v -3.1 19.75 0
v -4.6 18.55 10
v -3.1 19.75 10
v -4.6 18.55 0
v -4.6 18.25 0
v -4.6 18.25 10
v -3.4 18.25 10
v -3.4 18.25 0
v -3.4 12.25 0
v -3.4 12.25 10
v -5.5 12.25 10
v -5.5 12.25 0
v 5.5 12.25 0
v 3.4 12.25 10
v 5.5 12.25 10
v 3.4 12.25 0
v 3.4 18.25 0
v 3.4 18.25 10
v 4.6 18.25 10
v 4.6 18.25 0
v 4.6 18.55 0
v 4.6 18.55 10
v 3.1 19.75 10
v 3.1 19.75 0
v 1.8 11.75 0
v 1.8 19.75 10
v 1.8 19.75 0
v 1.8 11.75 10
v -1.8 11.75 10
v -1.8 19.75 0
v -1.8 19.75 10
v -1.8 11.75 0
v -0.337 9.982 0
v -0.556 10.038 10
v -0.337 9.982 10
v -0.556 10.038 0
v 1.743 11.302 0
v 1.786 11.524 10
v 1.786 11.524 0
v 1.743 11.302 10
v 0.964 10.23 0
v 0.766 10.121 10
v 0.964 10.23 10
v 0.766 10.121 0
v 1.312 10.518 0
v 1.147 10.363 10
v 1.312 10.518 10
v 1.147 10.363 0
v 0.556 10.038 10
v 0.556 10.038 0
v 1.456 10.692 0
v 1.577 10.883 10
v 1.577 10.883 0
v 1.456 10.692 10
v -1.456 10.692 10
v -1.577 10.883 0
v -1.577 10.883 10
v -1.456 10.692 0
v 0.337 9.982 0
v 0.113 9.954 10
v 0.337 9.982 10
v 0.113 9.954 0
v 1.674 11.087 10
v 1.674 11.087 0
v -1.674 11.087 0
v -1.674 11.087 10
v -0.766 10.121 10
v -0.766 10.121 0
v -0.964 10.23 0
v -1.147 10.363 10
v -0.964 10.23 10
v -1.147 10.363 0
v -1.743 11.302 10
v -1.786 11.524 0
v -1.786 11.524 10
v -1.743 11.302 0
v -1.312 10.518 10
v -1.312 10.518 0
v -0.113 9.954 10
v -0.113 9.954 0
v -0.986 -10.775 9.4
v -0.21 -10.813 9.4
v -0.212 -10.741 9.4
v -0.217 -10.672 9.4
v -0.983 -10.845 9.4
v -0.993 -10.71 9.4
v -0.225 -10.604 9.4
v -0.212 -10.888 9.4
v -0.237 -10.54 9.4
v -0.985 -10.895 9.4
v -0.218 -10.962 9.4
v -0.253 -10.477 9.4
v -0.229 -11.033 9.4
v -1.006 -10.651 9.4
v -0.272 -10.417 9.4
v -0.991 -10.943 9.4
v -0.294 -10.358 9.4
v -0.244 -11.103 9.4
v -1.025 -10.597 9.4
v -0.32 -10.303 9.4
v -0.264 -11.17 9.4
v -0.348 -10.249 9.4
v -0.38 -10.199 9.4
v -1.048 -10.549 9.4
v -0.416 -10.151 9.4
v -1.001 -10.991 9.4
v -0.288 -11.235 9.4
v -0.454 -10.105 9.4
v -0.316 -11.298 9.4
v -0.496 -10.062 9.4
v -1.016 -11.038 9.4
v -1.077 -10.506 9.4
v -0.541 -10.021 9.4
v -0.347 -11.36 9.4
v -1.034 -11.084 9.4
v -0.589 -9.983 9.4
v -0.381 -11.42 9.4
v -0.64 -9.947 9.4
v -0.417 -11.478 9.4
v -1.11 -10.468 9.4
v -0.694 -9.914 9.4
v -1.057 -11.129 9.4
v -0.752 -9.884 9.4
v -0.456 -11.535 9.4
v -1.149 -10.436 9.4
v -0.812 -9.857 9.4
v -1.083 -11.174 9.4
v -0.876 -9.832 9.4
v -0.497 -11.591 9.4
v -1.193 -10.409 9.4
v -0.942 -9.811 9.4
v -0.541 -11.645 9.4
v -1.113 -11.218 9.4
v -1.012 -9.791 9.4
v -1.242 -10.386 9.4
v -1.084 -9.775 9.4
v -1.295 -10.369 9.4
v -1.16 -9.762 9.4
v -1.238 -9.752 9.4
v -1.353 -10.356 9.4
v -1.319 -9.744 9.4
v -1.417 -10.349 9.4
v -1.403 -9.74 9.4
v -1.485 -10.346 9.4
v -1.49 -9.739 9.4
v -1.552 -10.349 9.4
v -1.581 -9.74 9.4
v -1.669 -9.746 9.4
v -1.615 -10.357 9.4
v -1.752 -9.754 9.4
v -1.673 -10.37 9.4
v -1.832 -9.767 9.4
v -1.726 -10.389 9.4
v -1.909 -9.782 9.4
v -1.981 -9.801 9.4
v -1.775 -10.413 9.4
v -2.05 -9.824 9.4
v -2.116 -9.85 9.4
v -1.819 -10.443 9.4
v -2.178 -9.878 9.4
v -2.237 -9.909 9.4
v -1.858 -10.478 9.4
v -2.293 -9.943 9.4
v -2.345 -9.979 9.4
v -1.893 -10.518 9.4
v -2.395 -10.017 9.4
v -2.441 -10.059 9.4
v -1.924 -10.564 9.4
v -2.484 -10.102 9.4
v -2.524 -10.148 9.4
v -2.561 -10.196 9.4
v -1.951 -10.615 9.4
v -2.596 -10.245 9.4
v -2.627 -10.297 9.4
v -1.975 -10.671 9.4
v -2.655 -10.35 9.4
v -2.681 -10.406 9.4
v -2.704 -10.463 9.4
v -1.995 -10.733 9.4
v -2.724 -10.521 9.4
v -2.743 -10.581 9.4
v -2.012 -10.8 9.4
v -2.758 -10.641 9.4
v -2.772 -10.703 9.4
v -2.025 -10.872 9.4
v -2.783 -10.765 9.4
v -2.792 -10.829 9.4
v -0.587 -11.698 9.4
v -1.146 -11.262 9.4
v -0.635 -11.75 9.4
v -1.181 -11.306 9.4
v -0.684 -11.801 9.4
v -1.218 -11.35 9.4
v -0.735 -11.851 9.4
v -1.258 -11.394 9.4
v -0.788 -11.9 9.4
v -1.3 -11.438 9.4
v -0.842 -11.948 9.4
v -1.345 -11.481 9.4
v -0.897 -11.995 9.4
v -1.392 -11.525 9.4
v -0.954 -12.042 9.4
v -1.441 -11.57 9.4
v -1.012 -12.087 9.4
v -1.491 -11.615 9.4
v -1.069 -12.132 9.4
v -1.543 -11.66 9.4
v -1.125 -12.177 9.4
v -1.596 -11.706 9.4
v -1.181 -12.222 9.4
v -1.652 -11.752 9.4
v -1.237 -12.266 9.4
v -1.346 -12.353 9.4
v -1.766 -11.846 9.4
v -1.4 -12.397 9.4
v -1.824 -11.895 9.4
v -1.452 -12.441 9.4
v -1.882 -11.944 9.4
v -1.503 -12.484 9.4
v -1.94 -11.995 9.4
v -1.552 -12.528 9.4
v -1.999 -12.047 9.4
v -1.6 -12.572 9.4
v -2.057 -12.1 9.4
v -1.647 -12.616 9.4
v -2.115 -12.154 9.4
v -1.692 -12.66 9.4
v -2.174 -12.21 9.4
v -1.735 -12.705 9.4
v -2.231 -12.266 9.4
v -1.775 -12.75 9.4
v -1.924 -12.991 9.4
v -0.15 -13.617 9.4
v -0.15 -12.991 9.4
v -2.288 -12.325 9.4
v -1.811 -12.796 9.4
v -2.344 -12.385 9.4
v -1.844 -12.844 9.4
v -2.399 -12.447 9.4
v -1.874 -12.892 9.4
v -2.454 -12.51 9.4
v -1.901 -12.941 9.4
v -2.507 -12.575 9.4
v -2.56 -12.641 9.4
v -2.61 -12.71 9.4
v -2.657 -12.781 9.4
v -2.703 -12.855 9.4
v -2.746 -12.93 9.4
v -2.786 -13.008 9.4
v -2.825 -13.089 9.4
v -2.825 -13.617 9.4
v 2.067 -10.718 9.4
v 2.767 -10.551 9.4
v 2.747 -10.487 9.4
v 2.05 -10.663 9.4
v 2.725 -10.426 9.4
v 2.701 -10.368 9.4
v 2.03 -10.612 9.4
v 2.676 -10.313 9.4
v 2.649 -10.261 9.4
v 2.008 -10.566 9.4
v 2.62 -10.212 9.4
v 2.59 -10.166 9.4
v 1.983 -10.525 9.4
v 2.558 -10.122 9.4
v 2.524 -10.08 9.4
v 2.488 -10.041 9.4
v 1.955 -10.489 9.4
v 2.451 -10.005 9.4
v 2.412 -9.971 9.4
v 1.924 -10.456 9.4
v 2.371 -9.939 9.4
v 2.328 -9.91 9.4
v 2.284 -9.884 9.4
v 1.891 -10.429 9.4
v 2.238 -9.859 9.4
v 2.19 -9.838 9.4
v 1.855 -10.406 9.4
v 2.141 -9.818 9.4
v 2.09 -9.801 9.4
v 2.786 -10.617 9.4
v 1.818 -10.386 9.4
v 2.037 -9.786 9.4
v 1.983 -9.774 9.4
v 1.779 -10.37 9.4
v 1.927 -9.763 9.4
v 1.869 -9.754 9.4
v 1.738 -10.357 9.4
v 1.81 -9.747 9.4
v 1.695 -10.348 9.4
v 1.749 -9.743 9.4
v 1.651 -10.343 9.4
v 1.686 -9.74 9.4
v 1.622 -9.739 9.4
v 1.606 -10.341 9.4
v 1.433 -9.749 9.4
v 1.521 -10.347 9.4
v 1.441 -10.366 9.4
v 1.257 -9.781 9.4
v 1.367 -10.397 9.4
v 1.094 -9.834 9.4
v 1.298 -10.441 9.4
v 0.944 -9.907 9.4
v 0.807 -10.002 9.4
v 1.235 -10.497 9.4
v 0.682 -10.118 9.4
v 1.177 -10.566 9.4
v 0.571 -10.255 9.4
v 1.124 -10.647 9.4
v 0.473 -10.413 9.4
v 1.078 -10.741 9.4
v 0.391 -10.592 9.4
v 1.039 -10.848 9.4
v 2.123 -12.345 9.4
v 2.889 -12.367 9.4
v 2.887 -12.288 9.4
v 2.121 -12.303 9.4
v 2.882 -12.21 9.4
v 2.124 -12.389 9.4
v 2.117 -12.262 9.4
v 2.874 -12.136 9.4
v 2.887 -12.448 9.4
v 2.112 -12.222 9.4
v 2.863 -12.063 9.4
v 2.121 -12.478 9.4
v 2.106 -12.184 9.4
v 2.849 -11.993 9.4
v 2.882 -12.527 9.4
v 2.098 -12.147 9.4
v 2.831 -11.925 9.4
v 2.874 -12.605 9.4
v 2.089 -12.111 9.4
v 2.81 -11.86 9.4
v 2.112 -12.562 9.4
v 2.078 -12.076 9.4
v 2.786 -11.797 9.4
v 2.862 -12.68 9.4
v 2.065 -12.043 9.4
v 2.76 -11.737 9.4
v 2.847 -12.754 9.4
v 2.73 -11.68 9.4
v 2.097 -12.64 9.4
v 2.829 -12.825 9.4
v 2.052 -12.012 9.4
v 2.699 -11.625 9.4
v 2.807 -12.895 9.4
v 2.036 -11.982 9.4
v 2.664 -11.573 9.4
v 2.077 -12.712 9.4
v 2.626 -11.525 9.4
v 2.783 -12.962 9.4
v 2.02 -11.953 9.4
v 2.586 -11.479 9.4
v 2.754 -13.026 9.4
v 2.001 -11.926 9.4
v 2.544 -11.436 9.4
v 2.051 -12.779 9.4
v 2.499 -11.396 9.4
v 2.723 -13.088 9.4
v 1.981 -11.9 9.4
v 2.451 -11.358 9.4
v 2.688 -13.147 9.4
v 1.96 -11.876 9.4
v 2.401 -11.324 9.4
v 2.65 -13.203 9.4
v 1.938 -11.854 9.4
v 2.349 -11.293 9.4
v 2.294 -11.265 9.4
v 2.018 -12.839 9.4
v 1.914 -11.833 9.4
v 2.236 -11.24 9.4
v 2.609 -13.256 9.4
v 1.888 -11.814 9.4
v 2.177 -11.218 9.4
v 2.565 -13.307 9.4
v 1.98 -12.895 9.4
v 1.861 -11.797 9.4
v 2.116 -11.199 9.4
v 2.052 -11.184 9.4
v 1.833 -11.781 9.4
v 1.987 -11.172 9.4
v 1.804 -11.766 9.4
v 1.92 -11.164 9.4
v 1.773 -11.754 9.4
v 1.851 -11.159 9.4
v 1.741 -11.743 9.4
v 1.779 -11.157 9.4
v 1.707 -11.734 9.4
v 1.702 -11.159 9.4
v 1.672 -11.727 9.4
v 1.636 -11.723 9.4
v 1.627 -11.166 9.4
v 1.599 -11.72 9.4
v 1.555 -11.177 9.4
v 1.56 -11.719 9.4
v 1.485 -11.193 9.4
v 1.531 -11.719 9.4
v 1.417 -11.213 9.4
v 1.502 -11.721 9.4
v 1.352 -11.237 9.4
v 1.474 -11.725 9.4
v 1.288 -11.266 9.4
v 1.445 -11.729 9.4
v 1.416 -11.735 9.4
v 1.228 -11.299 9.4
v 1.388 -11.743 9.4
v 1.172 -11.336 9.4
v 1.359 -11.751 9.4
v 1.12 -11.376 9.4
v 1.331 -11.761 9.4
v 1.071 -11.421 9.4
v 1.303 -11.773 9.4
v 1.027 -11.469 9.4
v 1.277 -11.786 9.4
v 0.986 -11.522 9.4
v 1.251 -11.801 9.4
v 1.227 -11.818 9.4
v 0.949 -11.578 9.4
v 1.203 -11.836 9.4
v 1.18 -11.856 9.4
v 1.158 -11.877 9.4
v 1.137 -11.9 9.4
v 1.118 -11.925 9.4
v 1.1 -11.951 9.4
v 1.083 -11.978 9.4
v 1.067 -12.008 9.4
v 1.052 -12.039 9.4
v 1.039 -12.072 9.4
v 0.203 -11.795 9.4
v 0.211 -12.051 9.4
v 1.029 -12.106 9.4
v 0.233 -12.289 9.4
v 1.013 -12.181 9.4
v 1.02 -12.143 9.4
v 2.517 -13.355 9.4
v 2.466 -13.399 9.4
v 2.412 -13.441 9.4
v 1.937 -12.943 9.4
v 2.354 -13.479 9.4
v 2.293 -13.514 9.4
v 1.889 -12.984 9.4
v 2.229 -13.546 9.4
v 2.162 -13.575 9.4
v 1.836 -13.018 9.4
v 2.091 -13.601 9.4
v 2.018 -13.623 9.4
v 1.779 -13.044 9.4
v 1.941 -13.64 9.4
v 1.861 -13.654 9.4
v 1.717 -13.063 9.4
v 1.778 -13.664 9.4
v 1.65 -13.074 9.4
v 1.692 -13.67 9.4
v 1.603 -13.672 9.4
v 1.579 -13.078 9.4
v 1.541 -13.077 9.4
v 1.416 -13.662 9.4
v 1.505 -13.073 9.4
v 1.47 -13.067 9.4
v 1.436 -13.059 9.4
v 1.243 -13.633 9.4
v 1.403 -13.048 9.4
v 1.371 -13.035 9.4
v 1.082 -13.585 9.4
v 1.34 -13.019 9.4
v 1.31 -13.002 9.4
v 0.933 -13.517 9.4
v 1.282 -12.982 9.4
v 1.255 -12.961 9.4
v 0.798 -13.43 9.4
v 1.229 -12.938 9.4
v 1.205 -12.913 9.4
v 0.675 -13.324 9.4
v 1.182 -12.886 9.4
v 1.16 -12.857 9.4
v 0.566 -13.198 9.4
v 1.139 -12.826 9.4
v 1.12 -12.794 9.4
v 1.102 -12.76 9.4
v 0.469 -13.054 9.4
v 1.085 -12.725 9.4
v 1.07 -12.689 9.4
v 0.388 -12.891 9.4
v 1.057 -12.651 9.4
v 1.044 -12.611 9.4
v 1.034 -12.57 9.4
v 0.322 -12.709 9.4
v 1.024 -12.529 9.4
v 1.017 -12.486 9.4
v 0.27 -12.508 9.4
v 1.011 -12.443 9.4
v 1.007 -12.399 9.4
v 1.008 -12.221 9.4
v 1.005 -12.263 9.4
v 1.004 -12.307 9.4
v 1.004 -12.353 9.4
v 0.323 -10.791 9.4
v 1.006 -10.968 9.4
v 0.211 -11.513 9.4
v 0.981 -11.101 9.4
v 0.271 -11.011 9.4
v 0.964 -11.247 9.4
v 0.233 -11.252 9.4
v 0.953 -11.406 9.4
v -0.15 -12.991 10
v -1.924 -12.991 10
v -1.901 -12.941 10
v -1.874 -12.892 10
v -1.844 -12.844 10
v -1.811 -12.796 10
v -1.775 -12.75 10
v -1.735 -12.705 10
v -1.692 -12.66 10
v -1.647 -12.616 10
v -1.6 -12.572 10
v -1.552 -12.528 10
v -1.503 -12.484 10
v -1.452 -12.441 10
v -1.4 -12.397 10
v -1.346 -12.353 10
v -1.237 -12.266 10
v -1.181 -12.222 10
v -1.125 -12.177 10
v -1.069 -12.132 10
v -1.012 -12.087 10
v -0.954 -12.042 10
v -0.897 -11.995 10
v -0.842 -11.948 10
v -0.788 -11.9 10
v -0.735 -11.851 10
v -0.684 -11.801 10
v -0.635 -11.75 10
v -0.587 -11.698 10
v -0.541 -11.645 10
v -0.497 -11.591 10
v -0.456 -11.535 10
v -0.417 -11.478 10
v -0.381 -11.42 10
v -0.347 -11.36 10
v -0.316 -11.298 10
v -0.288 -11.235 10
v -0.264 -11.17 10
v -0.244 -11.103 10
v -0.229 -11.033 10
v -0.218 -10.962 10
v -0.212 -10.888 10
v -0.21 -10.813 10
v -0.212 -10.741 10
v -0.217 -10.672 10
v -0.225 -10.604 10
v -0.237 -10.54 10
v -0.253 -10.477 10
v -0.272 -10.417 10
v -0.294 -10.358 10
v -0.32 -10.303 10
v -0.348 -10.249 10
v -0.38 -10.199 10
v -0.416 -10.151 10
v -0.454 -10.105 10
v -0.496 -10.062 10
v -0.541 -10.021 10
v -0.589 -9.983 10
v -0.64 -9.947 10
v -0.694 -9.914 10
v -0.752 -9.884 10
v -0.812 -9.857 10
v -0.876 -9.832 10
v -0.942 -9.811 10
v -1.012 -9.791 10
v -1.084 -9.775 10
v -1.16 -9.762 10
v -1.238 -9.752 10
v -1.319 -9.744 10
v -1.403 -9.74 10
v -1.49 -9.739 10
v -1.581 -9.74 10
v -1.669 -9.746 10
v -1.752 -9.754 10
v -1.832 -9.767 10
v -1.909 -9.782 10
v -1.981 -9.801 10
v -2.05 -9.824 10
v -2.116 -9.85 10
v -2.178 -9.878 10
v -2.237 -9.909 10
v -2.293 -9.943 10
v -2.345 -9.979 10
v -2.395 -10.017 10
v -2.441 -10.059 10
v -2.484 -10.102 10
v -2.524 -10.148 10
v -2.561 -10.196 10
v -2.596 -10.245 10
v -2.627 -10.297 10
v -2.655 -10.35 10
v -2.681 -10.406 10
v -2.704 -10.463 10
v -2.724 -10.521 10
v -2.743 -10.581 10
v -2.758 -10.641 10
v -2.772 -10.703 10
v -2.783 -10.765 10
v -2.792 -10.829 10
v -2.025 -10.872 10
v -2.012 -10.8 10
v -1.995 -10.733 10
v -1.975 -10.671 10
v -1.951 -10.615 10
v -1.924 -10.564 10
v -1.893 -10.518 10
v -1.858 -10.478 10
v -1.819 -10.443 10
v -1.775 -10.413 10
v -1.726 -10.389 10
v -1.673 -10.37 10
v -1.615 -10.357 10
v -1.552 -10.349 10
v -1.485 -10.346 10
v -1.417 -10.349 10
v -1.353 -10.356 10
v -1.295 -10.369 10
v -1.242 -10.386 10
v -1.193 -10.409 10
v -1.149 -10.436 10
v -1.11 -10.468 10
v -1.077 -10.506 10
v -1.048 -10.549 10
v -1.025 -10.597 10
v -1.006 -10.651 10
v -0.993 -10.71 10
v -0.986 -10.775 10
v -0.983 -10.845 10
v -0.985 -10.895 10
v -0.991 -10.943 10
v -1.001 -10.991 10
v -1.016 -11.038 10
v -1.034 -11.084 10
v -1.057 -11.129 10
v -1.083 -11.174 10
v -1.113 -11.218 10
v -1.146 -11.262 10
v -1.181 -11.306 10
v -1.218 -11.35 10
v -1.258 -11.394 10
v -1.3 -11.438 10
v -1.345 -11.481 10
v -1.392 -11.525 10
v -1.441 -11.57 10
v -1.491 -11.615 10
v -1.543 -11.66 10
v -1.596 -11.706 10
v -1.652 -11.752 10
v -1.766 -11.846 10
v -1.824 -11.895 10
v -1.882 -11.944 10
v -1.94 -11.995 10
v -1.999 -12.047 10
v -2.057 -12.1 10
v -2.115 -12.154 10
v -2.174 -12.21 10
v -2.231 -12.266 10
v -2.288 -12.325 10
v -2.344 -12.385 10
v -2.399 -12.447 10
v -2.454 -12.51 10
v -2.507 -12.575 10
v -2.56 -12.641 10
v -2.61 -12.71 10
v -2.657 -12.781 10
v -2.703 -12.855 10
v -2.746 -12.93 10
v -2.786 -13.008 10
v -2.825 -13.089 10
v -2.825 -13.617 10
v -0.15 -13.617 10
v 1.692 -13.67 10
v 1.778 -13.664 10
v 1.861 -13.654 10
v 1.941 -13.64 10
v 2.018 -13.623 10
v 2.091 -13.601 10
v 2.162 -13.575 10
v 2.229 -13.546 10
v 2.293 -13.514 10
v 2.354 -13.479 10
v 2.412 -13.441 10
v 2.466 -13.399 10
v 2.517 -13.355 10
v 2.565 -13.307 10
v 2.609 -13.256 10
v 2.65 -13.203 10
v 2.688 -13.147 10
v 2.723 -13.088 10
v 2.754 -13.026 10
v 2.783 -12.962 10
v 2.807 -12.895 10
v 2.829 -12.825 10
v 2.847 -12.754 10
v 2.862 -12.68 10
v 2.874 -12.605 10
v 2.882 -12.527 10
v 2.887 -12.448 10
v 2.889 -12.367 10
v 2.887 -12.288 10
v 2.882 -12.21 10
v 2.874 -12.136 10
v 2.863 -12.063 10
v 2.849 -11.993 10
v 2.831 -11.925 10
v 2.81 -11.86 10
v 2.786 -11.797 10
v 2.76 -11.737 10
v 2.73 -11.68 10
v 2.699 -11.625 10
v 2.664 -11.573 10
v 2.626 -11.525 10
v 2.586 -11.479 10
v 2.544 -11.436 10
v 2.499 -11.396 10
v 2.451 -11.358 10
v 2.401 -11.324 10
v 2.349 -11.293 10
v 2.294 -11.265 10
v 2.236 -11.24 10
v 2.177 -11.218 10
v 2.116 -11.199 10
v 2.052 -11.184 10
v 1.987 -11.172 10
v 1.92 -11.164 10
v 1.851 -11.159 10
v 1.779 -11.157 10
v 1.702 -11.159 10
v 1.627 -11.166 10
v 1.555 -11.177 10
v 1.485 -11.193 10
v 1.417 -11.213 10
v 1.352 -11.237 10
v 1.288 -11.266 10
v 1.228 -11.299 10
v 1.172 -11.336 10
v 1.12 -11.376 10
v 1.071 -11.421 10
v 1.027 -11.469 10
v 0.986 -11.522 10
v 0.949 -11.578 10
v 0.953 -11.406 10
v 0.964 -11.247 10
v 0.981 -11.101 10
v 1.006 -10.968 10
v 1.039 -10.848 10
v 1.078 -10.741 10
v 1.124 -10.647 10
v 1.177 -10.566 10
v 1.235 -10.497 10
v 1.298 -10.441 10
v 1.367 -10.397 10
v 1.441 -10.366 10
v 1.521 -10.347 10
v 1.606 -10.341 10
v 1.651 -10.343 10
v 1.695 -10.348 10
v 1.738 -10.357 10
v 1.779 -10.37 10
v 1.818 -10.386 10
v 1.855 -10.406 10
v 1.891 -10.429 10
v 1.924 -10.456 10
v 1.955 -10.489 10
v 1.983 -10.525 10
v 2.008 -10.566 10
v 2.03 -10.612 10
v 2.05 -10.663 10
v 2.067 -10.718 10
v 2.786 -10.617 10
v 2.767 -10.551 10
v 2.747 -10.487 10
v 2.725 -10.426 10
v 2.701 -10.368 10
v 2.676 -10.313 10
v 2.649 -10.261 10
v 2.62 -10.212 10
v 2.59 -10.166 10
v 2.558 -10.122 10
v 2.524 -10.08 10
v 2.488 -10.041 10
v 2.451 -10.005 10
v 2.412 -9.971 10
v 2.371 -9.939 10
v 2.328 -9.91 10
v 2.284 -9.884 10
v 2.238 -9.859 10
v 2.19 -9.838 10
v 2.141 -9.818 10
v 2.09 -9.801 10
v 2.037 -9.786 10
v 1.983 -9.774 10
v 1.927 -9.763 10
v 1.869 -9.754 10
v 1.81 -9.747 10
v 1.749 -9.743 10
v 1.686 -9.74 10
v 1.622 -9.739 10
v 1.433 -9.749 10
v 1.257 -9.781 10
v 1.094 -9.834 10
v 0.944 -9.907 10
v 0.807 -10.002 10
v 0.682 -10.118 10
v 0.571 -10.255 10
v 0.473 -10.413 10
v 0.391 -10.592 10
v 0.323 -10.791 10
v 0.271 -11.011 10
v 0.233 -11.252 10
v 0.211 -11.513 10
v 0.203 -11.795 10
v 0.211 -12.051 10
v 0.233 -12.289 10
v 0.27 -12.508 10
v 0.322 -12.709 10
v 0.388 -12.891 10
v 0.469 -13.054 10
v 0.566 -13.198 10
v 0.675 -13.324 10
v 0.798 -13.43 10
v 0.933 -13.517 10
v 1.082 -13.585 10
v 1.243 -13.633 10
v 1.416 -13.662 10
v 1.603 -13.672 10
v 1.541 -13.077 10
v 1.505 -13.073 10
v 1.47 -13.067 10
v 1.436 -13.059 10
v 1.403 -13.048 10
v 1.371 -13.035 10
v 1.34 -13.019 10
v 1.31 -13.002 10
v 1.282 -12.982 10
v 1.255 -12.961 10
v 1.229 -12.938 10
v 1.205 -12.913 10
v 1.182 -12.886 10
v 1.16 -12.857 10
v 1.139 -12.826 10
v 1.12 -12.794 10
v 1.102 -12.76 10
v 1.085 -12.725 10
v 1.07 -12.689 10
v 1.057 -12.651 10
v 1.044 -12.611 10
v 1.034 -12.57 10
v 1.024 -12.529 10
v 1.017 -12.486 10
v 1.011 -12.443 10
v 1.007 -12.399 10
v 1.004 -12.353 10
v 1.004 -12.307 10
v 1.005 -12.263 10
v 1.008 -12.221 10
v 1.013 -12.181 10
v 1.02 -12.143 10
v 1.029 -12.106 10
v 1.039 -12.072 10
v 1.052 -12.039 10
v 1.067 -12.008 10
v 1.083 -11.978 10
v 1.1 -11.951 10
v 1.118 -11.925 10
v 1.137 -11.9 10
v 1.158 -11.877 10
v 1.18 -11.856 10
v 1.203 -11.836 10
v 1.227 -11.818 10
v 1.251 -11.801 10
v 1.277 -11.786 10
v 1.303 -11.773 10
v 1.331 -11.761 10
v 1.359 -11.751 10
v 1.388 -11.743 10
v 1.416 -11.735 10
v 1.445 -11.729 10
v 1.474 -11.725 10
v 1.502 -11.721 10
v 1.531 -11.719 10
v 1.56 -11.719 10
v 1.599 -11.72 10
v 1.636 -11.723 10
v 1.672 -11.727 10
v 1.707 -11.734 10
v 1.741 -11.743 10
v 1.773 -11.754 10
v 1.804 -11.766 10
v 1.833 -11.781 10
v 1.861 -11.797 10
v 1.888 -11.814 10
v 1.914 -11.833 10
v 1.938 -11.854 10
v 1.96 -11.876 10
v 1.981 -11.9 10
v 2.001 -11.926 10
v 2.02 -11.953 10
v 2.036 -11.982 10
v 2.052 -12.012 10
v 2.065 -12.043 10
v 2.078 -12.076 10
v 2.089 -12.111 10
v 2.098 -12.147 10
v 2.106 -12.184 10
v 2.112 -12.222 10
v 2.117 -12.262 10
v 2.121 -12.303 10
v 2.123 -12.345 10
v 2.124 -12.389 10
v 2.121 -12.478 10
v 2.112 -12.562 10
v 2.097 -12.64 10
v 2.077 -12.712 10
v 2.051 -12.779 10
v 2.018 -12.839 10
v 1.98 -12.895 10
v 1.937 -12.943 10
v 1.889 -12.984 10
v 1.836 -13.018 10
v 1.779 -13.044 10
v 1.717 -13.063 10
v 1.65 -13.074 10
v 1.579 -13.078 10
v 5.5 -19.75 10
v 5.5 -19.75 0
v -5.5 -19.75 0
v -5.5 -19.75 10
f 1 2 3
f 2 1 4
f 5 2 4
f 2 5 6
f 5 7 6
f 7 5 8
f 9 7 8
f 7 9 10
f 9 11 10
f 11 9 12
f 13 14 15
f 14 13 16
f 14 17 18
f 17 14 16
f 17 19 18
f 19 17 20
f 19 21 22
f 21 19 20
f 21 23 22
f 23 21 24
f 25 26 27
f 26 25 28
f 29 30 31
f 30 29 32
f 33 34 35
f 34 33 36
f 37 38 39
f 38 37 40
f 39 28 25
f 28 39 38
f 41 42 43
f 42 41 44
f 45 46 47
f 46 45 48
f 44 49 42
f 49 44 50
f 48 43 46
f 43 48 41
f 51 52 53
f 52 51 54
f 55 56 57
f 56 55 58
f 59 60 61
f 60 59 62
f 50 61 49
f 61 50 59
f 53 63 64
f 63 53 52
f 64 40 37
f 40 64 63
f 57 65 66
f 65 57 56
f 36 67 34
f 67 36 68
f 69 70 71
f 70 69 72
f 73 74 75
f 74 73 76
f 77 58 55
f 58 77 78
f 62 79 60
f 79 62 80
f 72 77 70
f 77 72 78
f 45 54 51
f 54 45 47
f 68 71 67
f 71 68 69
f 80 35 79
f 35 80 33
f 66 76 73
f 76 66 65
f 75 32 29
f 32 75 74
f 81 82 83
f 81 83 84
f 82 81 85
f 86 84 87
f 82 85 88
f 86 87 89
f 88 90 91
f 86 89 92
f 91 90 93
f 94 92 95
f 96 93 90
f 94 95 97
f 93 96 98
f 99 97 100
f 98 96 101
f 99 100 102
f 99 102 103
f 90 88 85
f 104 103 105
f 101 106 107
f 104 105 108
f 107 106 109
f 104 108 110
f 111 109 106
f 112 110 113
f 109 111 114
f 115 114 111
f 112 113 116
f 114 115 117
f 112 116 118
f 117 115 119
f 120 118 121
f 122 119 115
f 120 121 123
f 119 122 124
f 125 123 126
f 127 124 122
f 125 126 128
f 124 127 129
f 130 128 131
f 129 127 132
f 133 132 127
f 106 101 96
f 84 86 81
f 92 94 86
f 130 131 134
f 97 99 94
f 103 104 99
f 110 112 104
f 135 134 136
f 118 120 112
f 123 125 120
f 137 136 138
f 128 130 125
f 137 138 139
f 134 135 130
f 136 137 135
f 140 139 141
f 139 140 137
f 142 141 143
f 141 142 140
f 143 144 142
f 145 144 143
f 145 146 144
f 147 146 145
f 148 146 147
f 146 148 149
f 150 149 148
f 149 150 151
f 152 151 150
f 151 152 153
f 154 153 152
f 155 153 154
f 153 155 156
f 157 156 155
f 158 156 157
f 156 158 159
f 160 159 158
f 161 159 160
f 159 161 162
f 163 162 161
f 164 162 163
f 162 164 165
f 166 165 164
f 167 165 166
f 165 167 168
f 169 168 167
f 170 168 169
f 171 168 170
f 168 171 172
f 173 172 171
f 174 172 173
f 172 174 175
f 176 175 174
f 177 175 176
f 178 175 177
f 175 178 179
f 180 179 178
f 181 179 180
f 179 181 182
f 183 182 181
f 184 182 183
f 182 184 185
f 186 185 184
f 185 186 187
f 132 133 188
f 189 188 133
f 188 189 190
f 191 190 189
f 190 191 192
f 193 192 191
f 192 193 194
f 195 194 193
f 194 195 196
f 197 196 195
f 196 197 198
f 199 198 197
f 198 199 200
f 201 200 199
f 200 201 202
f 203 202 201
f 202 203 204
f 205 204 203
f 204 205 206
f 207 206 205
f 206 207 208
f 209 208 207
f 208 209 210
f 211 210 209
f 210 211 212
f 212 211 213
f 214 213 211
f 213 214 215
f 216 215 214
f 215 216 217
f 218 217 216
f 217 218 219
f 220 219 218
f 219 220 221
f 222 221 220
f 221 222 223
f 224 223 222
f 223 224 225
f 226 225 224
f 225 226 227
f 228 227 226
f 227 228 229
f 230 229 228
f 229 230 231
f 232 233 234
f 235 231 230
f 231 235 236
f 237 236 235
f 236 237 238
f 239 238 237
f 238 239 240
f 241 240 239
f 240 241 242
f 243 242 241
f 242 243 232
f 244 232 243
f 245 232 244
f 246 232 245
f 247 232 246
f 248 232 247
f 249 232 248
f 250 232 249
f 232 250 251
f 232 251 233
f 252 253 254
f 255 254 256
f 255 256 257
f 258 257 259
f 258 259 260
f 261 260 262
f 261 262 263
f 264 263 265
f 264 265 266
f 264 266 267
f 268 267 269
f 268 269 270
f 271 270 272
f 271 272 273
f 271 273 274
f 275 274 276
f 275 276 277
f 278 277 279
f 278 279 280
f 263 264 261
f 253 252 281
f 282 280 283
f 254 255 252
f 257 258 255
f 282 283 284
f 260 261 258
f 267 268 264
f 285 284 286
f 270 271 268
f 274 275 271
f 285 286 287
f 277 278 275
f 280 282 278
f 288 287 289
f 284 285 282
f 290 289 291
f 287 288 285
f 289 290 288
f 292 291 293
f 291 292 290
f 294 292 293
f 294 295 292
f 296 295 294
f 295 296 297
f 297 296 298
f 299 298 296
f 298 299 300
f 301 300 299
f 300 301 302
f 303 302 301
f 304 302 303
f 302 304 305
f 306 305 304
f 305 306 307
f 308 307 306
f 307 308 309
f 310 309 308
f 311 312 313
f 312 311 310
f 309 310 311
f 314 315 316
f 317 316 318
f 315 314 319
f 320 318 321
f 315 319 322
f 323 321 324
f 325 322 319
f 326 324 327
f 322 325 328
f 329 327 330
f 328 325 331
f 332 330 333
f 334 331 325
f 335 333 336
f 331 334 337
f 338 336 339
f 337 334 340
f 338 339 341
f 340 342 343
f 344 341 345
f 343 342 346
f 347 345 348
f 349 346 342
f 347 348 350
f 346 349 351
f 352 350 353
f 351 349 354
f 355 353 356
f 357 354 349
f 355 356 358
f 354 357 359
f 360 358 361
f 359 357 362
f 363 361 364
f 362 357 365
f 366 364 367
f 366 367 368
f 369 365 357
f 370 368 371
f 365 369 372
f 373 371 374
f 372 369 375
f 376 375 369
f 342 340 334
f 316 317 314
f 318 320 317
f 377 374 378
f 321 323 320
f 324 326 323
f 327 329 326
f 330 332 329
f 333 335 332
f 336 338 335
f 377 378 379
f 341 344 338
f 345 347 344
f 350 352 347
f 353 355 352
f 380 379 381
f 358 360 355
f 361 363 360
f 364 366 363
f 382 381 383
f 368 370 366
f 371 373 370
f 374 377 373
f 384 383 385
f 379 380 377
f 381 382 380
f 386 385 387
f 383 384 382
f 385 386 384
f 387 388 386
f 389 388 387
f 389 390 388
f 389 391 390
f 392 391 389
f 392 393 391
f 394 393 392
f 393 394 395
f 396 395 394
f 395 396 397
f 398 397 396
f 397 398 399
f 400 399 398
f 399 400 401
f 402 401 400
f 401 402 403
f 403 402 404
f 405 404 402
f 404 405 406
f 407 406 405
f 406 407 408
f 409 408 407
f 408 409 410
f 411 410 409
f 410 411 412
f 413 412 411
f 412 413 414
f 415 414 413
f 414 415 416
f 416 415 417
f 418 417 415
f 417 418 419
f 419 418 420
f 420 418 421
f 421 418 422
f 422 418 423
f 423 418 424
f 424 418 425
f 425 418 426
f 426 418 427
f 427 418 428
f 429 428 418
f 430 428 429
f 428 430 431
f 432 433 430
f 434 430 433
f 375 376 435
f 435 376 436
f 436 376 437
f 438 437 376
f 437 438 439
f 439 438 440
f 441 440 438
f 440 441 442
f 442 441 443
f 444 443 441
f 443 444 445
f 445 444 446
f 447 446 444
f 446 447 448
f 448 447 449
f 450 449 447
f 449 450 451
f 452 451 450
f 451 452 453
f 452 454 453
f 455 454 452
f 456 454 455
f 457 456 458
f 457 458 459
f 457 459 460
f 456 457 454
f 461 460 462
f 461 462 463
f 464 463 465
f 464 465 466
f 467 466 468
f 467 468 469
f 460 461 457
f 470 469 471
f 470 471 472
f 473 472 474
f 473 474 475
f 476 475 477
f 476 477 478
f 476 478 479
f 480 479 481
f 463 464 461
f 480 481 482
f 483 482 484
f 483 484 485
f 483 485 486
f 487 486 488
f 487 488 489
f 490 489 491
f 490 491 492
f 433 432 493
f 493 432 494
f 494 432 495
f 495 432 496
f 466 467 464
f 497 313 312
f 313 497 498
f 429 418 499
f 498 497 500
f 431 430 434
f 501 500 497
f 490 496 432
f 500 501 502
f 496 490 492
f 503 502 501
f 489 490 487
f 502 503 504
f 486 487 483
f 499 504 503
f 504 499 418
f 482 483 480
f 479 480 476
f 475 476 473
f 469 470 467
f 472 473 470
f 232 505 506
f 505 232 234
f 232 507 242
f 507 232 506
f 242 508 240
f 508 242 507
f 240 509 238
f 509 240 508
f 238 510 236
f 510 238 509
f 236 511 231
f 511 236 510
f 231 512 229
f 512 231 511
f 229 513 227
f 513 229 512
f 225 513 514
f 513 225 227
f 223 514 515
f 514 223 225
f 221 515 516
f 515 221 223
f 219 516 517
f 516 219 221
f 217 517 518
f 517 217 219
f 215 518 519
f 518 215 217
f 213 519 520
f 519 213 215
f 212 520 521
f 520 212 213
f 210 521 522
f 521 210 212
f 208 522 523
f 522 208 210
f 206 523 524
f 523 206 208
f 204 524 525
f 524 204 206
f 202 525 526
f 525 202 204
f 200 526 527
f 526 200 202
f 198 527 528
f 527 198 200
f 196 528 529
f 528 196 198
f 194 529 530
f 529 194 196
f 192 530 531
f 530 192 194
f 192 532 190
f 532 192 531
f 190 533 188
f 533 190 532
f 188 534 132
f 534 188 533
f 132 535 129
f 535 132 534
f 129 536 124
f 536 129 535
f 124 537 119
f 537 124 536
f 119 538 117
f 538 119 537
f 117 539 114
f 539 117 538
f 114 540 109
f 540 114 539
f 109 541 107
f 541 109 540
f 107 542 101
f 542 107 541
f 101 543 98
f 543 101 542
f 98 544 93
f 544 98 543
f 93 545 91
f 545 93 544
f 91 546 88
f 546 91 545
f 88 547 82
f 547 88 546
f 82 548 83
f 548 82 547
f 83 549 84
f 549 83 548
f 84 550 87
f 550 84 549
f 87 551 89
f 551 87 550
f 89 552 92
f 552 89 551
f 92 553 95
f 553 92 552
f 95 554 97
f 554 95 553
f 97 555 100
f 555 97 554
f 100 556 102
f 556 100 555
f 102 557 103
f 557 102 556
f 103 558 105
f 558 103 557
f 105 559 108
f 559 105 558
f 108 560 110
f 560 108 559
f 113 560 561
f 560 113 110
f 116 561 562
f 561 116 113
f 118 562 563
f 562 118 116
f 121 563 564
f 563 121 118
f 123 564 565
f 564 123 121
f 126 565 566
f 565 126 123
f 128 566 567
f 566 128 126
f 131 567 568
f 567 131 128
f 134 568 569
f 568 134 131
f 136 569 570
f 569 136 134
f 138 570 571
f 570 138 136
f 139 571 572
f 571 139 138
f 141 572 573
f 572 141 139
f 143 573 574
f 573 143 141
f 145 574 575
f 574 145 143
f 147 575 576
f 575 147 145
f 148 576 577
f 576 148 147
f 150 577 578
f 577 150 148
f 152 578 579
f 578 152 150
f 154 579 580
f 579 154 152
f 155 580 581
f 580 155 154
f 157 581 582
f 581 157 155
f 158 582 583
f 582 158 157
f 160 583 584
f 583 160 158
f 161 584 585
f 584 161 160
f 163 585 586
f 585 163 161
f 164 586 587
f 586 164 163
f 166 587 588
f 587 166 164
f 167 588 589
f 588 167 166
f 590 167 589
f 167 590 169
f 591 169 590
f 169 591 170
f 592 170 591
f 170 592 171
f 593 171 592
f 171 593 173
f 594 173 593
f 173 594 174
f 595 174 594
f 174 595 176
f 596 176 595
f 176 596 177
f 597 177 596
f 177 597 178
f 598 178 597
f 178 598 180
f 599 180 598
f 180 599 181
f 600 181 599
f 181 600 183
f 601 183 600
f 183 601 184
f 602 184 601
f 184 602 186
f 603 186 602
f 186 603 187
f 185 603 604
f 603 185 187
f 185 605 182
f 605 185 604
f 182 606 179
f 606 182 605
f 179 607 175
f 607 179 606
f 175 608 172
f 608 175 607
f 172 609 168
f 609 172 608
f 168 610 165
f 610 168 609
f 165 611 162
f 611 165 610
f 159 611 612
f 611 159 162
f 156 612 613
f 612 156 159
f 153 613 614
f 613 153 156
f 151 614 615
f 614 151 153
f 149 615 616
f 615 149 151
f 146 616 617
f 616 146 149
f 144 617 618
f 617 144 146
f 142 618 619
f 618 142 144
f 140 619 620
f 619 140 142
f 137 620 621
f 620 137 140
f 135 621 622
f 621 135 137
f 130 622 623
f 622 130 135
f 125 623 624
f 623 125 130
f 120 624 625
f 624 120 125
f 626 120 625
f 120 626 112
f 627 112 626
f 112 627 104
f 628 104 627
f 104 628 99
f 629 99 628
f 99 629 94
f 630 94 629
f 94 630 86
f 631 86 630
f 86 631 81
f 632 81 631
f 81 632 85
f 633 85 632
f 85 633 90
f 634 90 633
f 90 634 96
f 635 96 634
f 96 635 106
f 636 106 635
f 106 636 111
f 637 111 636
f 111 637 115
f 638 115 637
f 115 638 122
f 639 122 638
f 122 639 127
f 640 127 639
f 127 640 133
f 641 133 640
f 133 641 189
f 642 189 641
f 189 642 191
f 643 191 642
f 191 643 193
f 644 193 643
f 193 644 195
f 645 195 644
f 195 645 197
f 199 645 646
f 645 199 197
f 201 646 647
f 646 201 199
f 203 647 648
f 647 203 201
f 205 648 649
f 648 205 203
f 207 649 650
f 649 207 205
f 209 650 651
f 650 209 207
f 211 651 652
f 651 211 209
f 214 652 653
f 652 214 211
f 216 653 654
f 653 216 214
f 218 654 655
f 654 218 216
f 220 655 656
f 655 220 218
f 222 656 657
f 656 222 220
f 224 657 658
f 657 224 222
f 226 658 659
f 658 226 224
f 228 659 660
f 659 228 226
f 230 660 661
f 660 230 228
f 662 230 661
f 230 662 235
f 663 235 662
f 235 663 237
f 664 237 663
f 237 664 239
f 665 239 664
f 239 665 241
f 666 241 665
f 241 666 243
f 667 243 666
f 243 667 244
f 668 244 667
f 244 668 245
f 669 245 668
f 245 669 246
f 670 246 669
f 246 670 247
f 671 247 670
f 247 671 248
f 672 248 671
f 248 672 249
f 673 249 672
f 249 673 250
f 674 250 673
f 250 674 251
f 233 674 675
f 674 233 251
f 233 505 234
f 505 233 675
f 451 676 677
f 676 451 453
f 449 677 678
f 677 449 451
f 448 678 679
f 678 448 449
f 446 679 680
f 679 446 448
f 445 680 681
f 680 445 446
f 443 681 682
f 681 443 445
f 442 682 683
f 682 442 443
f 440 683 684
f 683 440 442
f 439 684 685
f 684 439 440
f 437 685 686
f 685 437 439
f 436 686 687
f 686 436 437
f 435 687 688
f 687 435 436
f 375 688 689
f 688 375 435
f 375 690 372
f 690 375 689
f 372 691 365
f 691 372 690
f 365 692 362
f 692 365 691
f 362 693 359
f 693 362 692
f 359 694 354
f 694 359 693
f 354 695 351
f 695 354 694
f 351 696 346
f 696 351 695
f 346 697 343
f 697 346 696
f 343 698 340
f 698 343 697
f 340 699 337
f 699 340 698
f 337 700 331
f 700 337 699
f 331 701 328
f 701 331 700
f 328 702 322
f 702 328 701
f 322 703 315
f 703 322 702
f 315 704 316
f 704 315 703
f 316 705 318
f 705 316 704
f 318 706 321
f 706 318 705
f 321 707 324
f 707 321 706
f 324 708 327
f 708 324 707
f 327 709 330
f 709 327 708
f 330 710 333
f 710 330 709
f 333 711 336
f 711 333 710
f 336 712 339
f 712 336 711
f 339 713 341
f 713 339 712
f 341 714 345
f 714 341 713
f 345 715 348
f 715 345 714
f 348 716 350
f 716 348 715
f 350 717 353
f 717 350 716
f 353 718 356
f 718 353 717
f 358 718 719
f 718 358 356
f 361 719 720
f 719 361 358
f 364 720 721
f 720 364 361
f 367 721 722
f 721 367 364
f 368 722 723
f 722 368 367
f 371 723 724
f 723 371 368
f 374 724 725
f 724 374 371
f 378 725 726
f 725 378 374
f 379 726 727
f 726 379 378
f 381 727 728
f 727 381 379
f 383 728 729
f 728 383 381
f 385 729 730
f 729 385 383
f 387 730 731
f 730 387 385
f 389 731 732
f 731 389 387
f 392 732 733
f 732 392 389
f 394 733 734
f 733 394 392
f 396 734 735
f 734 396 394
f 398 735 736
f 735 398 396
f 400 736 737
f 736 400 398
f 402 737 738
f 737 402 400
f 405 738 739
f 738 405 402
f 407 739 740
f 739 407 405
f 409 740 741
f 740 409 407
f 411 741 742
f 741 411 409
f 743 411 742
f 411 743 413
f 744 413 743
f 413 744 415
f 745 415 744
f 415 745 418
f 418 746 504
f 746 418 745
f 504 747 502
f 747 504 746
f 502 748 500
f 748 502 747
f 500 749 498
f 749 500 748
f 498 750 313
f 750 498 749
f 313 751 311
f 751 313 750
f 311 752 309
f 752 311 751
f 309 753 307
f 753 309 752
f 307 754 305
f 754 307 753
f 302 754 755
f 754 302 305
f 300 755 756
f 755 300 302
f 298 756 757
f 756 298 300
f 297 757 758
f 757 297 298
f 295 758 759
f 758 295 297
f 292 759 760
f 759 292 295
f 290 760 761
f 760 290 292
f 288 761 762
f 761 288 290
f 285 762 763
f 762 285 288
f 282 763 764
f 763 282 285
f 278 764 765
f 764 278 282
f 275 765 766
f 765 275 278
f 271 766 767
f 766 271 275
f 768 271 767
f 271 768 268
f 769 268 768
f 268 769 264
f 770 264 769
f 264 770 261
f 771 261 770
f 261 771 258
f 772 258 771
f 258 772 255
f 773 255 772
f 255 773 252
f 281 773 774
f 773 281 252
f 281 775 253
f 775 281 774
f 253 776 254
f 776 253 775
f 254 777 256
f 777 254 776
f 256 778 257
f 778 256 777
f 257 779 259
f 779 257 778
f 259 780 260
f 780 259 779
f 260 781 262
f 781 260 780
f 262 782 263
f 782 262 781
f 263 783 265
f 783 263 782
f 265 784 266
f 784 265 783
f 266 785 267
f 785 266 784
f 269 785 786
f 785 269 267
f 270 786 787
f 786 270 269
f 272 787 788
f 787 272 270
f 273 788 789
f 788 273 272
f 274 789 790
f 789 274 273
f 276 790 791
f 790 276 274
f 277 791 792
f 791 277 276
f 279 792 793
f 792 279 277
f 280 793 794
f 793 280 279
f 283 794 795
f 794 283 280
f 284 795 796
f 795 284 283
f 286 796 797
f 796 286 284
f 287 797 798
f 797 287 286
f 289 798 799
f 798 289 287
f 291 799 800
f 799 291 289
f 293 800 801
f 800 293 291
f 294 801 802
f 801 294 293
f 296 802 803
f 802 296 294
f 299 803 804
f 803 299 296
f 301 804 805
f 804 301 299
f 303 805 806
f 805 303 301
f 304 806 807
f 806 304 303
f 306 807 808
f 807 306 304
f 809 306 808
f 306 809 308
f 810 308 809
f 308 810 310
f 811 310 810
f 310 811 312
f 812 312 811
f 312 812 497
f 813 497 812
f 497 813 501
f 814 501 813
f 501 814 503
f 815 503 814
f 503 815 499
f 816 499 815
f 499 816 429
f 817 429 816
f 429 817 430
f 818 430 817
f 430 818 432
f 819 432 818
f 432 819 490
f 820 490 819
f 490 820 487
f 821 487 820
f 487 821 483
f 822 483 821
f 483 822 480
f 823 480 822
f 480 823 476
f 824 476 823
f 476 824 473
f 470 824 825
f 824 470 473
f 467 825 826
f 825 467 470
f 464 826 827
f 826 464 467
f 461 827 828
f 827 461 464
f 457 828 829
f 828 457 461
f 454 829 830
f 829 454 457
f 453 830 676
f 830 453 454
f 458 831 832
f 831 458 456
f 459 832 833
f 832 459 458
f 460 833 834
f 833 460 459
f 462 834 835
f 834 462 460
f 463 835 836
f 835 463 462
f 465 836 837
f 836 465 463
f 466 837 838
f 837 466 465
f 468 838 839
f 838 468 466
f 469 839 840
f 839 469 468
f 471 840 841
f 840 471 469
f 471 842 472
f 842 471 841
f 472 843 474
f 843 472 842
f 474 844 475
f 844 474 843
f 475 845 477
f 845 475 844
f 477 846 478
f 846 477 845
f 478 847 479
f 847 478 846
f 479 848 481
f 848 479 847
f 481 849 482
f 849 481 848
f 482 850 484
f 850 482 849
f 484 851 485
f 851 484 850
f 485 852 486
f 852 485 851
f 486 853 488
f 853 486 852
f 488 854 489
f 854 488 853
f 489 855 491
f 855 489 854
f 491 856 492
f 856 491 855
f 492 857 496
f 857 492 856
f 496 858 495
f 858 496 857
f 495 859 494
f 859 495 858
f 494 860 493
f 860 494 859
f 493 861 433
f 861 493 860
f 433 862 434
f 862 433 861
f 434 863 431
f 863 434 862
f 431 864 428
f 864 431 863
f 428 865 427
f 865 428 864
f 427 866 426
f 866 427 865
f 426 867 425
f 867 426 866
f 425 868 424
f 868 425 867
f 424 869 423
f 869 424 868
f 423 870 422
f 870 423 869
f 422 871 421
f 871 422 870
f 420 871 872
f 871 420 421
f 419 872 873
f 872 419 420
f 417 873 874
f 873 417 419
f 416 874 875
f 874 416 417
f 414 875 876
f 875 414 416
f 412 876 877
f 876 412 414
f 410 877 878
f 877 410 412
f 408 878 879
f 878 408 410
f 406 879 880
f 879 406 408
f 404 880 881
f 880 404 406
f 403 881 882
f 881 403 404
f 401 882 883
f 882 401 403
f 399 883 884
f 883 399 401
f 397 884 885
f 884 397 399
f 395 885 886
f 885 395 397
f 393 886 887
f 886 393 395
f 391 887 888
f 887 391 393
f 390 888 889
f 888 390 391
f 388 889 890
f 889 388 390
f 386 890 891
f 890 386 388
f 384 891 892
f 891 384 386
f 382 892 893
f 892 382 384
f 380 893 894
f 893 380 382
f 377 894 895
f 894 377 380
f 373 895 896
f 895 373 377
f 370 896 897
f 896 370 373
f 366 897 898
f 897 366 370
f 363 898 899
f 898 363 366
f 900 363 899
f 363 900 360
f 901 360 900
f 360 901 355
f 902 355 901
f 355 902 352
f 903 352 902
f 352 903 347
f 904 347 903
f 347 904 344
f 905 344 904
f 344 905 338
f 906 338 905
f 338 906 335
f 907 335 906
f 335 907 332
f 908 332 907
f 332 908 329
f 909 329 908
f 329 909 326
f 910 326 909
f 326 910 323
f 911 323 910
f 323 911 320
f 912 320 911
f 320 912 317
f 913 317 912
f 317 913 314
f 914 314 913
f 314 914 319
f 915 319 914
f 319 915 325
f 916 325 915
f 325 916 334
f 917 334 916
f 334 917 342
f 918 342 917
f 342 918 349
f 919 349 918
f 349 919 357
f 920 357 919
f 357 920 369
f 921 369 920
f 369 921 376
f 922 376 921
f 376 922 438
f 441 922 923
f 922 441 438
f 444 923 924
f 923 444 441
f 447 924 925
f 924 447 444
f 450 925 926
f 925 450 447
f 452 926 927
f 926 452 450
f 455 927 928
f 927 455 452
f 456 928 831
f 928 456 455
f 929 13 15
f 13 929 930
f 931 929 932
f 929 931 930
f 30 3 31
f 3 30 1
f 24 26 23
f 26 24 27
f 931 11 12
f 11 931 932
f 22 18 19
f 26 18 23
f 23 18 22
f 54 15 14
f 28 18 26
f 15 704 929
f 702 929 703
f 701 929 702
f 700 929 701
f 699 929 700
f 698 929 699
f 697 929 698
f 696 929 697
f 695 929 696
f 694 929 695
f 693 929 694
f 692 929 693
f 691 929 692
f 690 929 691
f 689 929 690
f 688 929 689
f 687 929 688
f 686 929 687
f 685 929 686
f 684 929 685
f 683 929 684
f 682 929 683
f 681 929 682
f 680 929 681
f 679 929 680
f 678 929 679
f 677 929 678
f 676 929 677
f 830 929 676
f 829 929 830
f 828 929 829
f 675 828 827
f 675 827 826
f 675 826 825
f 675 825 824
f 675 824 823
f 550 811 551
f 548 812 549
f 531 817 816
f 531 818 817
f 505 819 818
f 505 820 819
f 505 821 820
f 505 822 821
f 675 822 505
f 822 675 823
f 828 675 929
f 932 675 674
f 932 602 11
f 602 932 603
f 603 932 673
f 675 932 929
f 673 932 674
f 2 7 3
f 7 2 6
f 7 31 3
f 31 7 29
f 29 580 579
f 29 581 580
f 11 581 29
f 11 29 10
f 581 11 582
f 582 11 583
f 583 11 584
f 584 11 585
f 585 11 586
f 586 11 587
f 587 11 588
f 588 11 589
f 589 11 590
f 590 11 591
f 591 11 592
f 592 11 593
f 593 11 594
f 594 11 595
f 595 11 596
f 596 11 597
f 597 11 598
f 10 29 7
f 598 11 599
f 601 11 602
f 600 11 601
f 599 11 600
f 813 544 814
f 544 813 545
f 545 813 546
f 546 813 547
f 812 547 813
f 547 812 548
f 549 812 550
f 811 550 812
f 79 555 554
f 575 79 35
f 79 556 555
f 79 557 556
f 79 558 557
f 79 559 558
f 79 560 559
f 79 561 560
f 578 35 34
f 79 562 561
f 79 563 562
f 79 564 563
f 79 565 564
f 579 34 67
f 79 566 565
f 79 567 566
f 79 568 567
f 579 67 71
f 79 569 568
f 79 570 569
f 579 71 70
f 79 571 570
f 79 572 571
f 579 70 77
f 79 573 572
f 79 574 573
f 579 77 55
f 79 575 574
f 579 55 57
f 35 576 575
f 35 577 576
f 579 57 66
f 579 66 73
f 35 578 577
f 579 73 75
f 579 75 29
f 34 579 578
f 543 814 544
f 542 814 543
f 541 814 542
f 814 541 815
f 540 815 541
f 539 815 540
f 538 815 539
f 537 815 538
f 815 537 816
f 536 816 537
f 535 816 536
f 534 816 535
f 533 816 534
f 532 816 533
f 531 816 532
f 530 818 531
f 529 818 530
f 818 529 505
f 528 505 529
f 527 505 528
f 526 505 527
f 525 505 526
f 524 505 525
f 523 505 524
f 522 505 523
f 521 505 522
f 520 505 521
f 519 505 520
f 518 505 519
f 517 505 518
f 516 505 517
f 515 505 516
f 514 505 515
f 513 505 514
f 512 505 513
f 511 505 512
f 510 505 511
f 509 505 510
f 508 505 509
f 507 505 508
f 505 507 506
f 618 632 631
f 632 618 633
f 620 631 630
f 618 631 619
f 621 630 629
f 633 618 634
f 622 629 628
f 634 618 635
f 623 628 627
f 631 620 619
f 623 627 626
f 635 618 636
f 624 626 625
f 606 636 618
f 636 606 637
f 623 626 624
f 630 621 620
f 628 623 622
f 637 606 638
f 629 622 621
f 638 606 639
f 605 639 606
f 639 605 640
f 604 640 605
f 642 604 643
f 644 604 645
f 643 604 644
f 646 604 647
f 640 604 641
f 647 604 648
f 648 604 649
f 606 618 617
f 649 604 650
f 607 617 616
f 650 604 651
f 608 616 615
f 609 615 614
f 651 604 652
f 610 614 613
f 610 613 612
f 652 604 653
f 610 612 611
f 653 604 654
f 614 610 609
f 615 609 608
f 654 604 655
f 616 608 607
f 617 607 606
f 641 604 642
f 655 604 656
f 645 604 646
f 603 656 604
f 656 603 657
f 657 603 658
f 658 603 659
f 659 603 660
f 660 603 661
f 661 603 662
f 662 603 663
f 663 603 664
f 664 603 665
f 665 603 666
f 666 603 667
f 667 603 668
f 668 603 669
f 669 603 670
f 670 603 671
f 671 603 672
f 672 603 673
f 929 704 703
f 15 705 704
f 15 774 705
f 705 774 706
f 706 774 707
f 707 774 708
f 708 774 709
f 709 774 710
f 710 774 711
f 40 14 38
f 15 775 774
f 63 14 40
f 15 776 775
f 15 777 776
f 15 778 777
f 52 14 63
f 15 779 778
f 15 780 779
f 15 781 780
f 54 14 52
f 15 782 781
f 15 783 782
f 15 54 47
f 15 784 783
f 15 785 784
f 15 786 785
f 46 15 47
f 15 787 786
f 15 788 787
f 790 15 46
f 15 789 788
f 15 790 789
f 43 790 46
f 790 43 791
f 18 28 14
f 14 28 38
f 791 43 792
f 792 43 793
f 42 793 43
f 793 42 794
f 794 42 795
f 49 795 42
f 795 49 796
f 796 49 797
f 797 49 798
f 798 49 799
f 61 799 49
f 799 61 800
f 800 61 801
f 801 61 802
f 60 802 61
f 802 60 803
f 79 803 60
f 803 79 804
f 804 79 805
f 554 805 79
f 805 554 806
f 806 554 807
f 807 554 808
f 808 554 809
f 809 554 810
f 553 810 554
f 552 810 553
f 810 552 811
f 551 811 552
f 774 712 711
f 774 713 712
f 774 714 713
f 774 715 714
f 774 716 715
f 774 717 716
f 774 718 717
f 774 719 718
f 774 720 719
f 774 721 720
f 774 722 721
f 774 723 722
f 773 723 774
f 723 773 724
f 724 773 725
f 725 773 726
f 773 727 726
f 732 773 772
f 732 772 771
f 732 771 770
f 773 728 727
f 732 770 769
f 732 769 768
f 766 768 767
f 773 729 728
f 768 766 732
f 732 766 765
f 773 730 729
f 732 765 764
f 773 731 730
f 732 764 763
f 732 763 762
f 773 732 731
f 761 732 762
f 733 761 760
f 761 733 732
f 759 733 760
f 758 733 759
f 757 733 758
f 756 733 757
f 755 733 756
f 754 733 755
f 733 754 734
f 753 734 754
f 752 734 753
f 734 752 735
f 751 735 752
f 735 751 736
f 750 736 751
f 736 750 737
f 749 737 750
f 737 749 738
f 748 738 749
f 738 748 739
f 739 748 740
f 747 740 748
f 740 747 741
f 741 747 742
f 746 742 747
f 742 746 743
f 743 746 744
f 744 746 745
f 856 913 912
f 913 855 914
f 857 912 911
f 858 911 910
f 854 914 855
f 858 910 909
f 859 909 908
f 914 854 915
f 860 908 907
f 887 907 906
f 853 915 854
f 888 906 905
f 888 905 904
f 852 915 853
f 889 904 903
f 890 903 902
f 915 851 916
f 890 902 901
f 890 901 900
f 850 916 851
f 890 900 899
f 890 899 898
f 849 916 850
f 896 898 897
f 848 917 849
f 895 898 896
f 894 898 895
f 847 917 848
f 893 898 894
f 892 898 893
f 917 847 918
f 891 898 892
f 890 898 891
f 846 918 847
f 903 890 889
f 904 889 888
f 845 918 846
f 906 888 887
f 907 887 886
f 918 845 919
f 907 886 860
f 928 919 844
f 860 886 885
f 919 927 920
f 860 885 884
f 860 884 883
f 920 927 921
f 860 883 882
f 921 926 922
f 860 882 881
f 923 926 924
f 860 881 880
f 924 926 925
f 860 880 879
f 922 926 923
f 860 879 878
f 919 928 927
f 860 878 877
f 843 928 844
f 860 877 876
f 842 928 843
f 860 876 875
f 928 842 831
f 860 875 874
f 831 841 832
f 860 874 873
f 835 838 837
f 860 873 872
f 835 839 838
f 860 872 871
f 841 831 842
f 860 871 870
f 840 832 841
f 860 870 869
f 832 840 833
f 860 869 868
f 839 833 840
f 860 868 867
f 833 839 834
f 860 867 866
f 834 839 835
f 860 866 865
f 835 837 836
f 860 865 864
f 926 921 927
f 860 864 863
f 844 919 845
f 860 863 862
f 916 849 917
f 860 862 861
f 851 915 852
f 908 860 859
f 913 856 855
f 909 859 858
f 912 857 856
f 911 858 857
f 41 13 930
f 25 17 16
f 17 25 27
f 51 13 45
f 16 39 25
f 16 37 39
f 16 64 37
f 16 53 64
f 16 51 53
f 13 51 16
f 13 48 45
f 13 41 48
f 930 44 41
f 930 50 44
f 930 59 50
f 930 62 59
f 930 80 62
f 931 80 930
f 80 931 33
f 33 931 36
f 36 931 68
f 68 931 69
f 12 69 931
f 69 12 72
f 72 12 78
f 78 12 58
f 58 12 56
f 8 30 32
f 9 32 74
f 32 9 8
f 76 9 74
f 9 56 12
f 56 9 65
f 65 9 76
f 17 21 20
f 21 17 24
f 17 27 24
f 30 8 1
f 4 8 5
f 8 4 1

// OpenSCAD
$fn = 50;

difference() {
	union() {
		translate(v = [0, 12.25, 0]) {
			rotate(a = [90, 0, 0]) {
				difference() {
					union() {
						translate(v = [-5.5, 0, -7.5]) {
							cube(size = [11.0, 10.0, 39.5]);
						}
					}
					union() {
						translate(v = [0, 10.1, 0]) {
							rotate(a = [90, 0, 0]) {
								linear_extrude(height = 10.2) {
									polygon(points = [[-3.1, -7.6], [-3.1, -7.5], [-4.6, -6.3], [-4.6, -6.0], [-3.4, -6.0], [-3.4, 0], [-5.6, 0], [-5.6, -7.6]]);
								}
							}
						}
						translate(v = [0, 10.1, 0]) {
							rotate(a = [90, 0, 0]) {
								linear_extrude(height = 10.2) {
									polygon(points = [[3.1, -7.6], [3.1, -7.5], [4.6, -6.3], [4.6, -6.0], [3.4, -6.0], [3.4, 0], [5.6, 0], [5.6, -7.6]]);
								}
							}
						}
						translate(v = [-1.7999999999999998, -0.1, -7.6]) {
							cube(size = [3.5999999999999996, 10.2, 8.1]);
						}
						translate(v = [0, 10.1, 0.5]) {
							rotate(a = [90, 0, 0]) {
								cylinder(h = 10.2, r = 1.7999999999999998);
							}
						}
						translate(v = [0, 9.4, 24.0]) {
							rotate(a = [-90, 0, 0]) {
								linear_extrude(height = 0.7) {
									text(font = "Arial:style=Bold", halign = "center", size = 4.0, text = "26", valign = "center");
								}
							}
						}
					}
				}
			}
		}
	}
	union();
}
